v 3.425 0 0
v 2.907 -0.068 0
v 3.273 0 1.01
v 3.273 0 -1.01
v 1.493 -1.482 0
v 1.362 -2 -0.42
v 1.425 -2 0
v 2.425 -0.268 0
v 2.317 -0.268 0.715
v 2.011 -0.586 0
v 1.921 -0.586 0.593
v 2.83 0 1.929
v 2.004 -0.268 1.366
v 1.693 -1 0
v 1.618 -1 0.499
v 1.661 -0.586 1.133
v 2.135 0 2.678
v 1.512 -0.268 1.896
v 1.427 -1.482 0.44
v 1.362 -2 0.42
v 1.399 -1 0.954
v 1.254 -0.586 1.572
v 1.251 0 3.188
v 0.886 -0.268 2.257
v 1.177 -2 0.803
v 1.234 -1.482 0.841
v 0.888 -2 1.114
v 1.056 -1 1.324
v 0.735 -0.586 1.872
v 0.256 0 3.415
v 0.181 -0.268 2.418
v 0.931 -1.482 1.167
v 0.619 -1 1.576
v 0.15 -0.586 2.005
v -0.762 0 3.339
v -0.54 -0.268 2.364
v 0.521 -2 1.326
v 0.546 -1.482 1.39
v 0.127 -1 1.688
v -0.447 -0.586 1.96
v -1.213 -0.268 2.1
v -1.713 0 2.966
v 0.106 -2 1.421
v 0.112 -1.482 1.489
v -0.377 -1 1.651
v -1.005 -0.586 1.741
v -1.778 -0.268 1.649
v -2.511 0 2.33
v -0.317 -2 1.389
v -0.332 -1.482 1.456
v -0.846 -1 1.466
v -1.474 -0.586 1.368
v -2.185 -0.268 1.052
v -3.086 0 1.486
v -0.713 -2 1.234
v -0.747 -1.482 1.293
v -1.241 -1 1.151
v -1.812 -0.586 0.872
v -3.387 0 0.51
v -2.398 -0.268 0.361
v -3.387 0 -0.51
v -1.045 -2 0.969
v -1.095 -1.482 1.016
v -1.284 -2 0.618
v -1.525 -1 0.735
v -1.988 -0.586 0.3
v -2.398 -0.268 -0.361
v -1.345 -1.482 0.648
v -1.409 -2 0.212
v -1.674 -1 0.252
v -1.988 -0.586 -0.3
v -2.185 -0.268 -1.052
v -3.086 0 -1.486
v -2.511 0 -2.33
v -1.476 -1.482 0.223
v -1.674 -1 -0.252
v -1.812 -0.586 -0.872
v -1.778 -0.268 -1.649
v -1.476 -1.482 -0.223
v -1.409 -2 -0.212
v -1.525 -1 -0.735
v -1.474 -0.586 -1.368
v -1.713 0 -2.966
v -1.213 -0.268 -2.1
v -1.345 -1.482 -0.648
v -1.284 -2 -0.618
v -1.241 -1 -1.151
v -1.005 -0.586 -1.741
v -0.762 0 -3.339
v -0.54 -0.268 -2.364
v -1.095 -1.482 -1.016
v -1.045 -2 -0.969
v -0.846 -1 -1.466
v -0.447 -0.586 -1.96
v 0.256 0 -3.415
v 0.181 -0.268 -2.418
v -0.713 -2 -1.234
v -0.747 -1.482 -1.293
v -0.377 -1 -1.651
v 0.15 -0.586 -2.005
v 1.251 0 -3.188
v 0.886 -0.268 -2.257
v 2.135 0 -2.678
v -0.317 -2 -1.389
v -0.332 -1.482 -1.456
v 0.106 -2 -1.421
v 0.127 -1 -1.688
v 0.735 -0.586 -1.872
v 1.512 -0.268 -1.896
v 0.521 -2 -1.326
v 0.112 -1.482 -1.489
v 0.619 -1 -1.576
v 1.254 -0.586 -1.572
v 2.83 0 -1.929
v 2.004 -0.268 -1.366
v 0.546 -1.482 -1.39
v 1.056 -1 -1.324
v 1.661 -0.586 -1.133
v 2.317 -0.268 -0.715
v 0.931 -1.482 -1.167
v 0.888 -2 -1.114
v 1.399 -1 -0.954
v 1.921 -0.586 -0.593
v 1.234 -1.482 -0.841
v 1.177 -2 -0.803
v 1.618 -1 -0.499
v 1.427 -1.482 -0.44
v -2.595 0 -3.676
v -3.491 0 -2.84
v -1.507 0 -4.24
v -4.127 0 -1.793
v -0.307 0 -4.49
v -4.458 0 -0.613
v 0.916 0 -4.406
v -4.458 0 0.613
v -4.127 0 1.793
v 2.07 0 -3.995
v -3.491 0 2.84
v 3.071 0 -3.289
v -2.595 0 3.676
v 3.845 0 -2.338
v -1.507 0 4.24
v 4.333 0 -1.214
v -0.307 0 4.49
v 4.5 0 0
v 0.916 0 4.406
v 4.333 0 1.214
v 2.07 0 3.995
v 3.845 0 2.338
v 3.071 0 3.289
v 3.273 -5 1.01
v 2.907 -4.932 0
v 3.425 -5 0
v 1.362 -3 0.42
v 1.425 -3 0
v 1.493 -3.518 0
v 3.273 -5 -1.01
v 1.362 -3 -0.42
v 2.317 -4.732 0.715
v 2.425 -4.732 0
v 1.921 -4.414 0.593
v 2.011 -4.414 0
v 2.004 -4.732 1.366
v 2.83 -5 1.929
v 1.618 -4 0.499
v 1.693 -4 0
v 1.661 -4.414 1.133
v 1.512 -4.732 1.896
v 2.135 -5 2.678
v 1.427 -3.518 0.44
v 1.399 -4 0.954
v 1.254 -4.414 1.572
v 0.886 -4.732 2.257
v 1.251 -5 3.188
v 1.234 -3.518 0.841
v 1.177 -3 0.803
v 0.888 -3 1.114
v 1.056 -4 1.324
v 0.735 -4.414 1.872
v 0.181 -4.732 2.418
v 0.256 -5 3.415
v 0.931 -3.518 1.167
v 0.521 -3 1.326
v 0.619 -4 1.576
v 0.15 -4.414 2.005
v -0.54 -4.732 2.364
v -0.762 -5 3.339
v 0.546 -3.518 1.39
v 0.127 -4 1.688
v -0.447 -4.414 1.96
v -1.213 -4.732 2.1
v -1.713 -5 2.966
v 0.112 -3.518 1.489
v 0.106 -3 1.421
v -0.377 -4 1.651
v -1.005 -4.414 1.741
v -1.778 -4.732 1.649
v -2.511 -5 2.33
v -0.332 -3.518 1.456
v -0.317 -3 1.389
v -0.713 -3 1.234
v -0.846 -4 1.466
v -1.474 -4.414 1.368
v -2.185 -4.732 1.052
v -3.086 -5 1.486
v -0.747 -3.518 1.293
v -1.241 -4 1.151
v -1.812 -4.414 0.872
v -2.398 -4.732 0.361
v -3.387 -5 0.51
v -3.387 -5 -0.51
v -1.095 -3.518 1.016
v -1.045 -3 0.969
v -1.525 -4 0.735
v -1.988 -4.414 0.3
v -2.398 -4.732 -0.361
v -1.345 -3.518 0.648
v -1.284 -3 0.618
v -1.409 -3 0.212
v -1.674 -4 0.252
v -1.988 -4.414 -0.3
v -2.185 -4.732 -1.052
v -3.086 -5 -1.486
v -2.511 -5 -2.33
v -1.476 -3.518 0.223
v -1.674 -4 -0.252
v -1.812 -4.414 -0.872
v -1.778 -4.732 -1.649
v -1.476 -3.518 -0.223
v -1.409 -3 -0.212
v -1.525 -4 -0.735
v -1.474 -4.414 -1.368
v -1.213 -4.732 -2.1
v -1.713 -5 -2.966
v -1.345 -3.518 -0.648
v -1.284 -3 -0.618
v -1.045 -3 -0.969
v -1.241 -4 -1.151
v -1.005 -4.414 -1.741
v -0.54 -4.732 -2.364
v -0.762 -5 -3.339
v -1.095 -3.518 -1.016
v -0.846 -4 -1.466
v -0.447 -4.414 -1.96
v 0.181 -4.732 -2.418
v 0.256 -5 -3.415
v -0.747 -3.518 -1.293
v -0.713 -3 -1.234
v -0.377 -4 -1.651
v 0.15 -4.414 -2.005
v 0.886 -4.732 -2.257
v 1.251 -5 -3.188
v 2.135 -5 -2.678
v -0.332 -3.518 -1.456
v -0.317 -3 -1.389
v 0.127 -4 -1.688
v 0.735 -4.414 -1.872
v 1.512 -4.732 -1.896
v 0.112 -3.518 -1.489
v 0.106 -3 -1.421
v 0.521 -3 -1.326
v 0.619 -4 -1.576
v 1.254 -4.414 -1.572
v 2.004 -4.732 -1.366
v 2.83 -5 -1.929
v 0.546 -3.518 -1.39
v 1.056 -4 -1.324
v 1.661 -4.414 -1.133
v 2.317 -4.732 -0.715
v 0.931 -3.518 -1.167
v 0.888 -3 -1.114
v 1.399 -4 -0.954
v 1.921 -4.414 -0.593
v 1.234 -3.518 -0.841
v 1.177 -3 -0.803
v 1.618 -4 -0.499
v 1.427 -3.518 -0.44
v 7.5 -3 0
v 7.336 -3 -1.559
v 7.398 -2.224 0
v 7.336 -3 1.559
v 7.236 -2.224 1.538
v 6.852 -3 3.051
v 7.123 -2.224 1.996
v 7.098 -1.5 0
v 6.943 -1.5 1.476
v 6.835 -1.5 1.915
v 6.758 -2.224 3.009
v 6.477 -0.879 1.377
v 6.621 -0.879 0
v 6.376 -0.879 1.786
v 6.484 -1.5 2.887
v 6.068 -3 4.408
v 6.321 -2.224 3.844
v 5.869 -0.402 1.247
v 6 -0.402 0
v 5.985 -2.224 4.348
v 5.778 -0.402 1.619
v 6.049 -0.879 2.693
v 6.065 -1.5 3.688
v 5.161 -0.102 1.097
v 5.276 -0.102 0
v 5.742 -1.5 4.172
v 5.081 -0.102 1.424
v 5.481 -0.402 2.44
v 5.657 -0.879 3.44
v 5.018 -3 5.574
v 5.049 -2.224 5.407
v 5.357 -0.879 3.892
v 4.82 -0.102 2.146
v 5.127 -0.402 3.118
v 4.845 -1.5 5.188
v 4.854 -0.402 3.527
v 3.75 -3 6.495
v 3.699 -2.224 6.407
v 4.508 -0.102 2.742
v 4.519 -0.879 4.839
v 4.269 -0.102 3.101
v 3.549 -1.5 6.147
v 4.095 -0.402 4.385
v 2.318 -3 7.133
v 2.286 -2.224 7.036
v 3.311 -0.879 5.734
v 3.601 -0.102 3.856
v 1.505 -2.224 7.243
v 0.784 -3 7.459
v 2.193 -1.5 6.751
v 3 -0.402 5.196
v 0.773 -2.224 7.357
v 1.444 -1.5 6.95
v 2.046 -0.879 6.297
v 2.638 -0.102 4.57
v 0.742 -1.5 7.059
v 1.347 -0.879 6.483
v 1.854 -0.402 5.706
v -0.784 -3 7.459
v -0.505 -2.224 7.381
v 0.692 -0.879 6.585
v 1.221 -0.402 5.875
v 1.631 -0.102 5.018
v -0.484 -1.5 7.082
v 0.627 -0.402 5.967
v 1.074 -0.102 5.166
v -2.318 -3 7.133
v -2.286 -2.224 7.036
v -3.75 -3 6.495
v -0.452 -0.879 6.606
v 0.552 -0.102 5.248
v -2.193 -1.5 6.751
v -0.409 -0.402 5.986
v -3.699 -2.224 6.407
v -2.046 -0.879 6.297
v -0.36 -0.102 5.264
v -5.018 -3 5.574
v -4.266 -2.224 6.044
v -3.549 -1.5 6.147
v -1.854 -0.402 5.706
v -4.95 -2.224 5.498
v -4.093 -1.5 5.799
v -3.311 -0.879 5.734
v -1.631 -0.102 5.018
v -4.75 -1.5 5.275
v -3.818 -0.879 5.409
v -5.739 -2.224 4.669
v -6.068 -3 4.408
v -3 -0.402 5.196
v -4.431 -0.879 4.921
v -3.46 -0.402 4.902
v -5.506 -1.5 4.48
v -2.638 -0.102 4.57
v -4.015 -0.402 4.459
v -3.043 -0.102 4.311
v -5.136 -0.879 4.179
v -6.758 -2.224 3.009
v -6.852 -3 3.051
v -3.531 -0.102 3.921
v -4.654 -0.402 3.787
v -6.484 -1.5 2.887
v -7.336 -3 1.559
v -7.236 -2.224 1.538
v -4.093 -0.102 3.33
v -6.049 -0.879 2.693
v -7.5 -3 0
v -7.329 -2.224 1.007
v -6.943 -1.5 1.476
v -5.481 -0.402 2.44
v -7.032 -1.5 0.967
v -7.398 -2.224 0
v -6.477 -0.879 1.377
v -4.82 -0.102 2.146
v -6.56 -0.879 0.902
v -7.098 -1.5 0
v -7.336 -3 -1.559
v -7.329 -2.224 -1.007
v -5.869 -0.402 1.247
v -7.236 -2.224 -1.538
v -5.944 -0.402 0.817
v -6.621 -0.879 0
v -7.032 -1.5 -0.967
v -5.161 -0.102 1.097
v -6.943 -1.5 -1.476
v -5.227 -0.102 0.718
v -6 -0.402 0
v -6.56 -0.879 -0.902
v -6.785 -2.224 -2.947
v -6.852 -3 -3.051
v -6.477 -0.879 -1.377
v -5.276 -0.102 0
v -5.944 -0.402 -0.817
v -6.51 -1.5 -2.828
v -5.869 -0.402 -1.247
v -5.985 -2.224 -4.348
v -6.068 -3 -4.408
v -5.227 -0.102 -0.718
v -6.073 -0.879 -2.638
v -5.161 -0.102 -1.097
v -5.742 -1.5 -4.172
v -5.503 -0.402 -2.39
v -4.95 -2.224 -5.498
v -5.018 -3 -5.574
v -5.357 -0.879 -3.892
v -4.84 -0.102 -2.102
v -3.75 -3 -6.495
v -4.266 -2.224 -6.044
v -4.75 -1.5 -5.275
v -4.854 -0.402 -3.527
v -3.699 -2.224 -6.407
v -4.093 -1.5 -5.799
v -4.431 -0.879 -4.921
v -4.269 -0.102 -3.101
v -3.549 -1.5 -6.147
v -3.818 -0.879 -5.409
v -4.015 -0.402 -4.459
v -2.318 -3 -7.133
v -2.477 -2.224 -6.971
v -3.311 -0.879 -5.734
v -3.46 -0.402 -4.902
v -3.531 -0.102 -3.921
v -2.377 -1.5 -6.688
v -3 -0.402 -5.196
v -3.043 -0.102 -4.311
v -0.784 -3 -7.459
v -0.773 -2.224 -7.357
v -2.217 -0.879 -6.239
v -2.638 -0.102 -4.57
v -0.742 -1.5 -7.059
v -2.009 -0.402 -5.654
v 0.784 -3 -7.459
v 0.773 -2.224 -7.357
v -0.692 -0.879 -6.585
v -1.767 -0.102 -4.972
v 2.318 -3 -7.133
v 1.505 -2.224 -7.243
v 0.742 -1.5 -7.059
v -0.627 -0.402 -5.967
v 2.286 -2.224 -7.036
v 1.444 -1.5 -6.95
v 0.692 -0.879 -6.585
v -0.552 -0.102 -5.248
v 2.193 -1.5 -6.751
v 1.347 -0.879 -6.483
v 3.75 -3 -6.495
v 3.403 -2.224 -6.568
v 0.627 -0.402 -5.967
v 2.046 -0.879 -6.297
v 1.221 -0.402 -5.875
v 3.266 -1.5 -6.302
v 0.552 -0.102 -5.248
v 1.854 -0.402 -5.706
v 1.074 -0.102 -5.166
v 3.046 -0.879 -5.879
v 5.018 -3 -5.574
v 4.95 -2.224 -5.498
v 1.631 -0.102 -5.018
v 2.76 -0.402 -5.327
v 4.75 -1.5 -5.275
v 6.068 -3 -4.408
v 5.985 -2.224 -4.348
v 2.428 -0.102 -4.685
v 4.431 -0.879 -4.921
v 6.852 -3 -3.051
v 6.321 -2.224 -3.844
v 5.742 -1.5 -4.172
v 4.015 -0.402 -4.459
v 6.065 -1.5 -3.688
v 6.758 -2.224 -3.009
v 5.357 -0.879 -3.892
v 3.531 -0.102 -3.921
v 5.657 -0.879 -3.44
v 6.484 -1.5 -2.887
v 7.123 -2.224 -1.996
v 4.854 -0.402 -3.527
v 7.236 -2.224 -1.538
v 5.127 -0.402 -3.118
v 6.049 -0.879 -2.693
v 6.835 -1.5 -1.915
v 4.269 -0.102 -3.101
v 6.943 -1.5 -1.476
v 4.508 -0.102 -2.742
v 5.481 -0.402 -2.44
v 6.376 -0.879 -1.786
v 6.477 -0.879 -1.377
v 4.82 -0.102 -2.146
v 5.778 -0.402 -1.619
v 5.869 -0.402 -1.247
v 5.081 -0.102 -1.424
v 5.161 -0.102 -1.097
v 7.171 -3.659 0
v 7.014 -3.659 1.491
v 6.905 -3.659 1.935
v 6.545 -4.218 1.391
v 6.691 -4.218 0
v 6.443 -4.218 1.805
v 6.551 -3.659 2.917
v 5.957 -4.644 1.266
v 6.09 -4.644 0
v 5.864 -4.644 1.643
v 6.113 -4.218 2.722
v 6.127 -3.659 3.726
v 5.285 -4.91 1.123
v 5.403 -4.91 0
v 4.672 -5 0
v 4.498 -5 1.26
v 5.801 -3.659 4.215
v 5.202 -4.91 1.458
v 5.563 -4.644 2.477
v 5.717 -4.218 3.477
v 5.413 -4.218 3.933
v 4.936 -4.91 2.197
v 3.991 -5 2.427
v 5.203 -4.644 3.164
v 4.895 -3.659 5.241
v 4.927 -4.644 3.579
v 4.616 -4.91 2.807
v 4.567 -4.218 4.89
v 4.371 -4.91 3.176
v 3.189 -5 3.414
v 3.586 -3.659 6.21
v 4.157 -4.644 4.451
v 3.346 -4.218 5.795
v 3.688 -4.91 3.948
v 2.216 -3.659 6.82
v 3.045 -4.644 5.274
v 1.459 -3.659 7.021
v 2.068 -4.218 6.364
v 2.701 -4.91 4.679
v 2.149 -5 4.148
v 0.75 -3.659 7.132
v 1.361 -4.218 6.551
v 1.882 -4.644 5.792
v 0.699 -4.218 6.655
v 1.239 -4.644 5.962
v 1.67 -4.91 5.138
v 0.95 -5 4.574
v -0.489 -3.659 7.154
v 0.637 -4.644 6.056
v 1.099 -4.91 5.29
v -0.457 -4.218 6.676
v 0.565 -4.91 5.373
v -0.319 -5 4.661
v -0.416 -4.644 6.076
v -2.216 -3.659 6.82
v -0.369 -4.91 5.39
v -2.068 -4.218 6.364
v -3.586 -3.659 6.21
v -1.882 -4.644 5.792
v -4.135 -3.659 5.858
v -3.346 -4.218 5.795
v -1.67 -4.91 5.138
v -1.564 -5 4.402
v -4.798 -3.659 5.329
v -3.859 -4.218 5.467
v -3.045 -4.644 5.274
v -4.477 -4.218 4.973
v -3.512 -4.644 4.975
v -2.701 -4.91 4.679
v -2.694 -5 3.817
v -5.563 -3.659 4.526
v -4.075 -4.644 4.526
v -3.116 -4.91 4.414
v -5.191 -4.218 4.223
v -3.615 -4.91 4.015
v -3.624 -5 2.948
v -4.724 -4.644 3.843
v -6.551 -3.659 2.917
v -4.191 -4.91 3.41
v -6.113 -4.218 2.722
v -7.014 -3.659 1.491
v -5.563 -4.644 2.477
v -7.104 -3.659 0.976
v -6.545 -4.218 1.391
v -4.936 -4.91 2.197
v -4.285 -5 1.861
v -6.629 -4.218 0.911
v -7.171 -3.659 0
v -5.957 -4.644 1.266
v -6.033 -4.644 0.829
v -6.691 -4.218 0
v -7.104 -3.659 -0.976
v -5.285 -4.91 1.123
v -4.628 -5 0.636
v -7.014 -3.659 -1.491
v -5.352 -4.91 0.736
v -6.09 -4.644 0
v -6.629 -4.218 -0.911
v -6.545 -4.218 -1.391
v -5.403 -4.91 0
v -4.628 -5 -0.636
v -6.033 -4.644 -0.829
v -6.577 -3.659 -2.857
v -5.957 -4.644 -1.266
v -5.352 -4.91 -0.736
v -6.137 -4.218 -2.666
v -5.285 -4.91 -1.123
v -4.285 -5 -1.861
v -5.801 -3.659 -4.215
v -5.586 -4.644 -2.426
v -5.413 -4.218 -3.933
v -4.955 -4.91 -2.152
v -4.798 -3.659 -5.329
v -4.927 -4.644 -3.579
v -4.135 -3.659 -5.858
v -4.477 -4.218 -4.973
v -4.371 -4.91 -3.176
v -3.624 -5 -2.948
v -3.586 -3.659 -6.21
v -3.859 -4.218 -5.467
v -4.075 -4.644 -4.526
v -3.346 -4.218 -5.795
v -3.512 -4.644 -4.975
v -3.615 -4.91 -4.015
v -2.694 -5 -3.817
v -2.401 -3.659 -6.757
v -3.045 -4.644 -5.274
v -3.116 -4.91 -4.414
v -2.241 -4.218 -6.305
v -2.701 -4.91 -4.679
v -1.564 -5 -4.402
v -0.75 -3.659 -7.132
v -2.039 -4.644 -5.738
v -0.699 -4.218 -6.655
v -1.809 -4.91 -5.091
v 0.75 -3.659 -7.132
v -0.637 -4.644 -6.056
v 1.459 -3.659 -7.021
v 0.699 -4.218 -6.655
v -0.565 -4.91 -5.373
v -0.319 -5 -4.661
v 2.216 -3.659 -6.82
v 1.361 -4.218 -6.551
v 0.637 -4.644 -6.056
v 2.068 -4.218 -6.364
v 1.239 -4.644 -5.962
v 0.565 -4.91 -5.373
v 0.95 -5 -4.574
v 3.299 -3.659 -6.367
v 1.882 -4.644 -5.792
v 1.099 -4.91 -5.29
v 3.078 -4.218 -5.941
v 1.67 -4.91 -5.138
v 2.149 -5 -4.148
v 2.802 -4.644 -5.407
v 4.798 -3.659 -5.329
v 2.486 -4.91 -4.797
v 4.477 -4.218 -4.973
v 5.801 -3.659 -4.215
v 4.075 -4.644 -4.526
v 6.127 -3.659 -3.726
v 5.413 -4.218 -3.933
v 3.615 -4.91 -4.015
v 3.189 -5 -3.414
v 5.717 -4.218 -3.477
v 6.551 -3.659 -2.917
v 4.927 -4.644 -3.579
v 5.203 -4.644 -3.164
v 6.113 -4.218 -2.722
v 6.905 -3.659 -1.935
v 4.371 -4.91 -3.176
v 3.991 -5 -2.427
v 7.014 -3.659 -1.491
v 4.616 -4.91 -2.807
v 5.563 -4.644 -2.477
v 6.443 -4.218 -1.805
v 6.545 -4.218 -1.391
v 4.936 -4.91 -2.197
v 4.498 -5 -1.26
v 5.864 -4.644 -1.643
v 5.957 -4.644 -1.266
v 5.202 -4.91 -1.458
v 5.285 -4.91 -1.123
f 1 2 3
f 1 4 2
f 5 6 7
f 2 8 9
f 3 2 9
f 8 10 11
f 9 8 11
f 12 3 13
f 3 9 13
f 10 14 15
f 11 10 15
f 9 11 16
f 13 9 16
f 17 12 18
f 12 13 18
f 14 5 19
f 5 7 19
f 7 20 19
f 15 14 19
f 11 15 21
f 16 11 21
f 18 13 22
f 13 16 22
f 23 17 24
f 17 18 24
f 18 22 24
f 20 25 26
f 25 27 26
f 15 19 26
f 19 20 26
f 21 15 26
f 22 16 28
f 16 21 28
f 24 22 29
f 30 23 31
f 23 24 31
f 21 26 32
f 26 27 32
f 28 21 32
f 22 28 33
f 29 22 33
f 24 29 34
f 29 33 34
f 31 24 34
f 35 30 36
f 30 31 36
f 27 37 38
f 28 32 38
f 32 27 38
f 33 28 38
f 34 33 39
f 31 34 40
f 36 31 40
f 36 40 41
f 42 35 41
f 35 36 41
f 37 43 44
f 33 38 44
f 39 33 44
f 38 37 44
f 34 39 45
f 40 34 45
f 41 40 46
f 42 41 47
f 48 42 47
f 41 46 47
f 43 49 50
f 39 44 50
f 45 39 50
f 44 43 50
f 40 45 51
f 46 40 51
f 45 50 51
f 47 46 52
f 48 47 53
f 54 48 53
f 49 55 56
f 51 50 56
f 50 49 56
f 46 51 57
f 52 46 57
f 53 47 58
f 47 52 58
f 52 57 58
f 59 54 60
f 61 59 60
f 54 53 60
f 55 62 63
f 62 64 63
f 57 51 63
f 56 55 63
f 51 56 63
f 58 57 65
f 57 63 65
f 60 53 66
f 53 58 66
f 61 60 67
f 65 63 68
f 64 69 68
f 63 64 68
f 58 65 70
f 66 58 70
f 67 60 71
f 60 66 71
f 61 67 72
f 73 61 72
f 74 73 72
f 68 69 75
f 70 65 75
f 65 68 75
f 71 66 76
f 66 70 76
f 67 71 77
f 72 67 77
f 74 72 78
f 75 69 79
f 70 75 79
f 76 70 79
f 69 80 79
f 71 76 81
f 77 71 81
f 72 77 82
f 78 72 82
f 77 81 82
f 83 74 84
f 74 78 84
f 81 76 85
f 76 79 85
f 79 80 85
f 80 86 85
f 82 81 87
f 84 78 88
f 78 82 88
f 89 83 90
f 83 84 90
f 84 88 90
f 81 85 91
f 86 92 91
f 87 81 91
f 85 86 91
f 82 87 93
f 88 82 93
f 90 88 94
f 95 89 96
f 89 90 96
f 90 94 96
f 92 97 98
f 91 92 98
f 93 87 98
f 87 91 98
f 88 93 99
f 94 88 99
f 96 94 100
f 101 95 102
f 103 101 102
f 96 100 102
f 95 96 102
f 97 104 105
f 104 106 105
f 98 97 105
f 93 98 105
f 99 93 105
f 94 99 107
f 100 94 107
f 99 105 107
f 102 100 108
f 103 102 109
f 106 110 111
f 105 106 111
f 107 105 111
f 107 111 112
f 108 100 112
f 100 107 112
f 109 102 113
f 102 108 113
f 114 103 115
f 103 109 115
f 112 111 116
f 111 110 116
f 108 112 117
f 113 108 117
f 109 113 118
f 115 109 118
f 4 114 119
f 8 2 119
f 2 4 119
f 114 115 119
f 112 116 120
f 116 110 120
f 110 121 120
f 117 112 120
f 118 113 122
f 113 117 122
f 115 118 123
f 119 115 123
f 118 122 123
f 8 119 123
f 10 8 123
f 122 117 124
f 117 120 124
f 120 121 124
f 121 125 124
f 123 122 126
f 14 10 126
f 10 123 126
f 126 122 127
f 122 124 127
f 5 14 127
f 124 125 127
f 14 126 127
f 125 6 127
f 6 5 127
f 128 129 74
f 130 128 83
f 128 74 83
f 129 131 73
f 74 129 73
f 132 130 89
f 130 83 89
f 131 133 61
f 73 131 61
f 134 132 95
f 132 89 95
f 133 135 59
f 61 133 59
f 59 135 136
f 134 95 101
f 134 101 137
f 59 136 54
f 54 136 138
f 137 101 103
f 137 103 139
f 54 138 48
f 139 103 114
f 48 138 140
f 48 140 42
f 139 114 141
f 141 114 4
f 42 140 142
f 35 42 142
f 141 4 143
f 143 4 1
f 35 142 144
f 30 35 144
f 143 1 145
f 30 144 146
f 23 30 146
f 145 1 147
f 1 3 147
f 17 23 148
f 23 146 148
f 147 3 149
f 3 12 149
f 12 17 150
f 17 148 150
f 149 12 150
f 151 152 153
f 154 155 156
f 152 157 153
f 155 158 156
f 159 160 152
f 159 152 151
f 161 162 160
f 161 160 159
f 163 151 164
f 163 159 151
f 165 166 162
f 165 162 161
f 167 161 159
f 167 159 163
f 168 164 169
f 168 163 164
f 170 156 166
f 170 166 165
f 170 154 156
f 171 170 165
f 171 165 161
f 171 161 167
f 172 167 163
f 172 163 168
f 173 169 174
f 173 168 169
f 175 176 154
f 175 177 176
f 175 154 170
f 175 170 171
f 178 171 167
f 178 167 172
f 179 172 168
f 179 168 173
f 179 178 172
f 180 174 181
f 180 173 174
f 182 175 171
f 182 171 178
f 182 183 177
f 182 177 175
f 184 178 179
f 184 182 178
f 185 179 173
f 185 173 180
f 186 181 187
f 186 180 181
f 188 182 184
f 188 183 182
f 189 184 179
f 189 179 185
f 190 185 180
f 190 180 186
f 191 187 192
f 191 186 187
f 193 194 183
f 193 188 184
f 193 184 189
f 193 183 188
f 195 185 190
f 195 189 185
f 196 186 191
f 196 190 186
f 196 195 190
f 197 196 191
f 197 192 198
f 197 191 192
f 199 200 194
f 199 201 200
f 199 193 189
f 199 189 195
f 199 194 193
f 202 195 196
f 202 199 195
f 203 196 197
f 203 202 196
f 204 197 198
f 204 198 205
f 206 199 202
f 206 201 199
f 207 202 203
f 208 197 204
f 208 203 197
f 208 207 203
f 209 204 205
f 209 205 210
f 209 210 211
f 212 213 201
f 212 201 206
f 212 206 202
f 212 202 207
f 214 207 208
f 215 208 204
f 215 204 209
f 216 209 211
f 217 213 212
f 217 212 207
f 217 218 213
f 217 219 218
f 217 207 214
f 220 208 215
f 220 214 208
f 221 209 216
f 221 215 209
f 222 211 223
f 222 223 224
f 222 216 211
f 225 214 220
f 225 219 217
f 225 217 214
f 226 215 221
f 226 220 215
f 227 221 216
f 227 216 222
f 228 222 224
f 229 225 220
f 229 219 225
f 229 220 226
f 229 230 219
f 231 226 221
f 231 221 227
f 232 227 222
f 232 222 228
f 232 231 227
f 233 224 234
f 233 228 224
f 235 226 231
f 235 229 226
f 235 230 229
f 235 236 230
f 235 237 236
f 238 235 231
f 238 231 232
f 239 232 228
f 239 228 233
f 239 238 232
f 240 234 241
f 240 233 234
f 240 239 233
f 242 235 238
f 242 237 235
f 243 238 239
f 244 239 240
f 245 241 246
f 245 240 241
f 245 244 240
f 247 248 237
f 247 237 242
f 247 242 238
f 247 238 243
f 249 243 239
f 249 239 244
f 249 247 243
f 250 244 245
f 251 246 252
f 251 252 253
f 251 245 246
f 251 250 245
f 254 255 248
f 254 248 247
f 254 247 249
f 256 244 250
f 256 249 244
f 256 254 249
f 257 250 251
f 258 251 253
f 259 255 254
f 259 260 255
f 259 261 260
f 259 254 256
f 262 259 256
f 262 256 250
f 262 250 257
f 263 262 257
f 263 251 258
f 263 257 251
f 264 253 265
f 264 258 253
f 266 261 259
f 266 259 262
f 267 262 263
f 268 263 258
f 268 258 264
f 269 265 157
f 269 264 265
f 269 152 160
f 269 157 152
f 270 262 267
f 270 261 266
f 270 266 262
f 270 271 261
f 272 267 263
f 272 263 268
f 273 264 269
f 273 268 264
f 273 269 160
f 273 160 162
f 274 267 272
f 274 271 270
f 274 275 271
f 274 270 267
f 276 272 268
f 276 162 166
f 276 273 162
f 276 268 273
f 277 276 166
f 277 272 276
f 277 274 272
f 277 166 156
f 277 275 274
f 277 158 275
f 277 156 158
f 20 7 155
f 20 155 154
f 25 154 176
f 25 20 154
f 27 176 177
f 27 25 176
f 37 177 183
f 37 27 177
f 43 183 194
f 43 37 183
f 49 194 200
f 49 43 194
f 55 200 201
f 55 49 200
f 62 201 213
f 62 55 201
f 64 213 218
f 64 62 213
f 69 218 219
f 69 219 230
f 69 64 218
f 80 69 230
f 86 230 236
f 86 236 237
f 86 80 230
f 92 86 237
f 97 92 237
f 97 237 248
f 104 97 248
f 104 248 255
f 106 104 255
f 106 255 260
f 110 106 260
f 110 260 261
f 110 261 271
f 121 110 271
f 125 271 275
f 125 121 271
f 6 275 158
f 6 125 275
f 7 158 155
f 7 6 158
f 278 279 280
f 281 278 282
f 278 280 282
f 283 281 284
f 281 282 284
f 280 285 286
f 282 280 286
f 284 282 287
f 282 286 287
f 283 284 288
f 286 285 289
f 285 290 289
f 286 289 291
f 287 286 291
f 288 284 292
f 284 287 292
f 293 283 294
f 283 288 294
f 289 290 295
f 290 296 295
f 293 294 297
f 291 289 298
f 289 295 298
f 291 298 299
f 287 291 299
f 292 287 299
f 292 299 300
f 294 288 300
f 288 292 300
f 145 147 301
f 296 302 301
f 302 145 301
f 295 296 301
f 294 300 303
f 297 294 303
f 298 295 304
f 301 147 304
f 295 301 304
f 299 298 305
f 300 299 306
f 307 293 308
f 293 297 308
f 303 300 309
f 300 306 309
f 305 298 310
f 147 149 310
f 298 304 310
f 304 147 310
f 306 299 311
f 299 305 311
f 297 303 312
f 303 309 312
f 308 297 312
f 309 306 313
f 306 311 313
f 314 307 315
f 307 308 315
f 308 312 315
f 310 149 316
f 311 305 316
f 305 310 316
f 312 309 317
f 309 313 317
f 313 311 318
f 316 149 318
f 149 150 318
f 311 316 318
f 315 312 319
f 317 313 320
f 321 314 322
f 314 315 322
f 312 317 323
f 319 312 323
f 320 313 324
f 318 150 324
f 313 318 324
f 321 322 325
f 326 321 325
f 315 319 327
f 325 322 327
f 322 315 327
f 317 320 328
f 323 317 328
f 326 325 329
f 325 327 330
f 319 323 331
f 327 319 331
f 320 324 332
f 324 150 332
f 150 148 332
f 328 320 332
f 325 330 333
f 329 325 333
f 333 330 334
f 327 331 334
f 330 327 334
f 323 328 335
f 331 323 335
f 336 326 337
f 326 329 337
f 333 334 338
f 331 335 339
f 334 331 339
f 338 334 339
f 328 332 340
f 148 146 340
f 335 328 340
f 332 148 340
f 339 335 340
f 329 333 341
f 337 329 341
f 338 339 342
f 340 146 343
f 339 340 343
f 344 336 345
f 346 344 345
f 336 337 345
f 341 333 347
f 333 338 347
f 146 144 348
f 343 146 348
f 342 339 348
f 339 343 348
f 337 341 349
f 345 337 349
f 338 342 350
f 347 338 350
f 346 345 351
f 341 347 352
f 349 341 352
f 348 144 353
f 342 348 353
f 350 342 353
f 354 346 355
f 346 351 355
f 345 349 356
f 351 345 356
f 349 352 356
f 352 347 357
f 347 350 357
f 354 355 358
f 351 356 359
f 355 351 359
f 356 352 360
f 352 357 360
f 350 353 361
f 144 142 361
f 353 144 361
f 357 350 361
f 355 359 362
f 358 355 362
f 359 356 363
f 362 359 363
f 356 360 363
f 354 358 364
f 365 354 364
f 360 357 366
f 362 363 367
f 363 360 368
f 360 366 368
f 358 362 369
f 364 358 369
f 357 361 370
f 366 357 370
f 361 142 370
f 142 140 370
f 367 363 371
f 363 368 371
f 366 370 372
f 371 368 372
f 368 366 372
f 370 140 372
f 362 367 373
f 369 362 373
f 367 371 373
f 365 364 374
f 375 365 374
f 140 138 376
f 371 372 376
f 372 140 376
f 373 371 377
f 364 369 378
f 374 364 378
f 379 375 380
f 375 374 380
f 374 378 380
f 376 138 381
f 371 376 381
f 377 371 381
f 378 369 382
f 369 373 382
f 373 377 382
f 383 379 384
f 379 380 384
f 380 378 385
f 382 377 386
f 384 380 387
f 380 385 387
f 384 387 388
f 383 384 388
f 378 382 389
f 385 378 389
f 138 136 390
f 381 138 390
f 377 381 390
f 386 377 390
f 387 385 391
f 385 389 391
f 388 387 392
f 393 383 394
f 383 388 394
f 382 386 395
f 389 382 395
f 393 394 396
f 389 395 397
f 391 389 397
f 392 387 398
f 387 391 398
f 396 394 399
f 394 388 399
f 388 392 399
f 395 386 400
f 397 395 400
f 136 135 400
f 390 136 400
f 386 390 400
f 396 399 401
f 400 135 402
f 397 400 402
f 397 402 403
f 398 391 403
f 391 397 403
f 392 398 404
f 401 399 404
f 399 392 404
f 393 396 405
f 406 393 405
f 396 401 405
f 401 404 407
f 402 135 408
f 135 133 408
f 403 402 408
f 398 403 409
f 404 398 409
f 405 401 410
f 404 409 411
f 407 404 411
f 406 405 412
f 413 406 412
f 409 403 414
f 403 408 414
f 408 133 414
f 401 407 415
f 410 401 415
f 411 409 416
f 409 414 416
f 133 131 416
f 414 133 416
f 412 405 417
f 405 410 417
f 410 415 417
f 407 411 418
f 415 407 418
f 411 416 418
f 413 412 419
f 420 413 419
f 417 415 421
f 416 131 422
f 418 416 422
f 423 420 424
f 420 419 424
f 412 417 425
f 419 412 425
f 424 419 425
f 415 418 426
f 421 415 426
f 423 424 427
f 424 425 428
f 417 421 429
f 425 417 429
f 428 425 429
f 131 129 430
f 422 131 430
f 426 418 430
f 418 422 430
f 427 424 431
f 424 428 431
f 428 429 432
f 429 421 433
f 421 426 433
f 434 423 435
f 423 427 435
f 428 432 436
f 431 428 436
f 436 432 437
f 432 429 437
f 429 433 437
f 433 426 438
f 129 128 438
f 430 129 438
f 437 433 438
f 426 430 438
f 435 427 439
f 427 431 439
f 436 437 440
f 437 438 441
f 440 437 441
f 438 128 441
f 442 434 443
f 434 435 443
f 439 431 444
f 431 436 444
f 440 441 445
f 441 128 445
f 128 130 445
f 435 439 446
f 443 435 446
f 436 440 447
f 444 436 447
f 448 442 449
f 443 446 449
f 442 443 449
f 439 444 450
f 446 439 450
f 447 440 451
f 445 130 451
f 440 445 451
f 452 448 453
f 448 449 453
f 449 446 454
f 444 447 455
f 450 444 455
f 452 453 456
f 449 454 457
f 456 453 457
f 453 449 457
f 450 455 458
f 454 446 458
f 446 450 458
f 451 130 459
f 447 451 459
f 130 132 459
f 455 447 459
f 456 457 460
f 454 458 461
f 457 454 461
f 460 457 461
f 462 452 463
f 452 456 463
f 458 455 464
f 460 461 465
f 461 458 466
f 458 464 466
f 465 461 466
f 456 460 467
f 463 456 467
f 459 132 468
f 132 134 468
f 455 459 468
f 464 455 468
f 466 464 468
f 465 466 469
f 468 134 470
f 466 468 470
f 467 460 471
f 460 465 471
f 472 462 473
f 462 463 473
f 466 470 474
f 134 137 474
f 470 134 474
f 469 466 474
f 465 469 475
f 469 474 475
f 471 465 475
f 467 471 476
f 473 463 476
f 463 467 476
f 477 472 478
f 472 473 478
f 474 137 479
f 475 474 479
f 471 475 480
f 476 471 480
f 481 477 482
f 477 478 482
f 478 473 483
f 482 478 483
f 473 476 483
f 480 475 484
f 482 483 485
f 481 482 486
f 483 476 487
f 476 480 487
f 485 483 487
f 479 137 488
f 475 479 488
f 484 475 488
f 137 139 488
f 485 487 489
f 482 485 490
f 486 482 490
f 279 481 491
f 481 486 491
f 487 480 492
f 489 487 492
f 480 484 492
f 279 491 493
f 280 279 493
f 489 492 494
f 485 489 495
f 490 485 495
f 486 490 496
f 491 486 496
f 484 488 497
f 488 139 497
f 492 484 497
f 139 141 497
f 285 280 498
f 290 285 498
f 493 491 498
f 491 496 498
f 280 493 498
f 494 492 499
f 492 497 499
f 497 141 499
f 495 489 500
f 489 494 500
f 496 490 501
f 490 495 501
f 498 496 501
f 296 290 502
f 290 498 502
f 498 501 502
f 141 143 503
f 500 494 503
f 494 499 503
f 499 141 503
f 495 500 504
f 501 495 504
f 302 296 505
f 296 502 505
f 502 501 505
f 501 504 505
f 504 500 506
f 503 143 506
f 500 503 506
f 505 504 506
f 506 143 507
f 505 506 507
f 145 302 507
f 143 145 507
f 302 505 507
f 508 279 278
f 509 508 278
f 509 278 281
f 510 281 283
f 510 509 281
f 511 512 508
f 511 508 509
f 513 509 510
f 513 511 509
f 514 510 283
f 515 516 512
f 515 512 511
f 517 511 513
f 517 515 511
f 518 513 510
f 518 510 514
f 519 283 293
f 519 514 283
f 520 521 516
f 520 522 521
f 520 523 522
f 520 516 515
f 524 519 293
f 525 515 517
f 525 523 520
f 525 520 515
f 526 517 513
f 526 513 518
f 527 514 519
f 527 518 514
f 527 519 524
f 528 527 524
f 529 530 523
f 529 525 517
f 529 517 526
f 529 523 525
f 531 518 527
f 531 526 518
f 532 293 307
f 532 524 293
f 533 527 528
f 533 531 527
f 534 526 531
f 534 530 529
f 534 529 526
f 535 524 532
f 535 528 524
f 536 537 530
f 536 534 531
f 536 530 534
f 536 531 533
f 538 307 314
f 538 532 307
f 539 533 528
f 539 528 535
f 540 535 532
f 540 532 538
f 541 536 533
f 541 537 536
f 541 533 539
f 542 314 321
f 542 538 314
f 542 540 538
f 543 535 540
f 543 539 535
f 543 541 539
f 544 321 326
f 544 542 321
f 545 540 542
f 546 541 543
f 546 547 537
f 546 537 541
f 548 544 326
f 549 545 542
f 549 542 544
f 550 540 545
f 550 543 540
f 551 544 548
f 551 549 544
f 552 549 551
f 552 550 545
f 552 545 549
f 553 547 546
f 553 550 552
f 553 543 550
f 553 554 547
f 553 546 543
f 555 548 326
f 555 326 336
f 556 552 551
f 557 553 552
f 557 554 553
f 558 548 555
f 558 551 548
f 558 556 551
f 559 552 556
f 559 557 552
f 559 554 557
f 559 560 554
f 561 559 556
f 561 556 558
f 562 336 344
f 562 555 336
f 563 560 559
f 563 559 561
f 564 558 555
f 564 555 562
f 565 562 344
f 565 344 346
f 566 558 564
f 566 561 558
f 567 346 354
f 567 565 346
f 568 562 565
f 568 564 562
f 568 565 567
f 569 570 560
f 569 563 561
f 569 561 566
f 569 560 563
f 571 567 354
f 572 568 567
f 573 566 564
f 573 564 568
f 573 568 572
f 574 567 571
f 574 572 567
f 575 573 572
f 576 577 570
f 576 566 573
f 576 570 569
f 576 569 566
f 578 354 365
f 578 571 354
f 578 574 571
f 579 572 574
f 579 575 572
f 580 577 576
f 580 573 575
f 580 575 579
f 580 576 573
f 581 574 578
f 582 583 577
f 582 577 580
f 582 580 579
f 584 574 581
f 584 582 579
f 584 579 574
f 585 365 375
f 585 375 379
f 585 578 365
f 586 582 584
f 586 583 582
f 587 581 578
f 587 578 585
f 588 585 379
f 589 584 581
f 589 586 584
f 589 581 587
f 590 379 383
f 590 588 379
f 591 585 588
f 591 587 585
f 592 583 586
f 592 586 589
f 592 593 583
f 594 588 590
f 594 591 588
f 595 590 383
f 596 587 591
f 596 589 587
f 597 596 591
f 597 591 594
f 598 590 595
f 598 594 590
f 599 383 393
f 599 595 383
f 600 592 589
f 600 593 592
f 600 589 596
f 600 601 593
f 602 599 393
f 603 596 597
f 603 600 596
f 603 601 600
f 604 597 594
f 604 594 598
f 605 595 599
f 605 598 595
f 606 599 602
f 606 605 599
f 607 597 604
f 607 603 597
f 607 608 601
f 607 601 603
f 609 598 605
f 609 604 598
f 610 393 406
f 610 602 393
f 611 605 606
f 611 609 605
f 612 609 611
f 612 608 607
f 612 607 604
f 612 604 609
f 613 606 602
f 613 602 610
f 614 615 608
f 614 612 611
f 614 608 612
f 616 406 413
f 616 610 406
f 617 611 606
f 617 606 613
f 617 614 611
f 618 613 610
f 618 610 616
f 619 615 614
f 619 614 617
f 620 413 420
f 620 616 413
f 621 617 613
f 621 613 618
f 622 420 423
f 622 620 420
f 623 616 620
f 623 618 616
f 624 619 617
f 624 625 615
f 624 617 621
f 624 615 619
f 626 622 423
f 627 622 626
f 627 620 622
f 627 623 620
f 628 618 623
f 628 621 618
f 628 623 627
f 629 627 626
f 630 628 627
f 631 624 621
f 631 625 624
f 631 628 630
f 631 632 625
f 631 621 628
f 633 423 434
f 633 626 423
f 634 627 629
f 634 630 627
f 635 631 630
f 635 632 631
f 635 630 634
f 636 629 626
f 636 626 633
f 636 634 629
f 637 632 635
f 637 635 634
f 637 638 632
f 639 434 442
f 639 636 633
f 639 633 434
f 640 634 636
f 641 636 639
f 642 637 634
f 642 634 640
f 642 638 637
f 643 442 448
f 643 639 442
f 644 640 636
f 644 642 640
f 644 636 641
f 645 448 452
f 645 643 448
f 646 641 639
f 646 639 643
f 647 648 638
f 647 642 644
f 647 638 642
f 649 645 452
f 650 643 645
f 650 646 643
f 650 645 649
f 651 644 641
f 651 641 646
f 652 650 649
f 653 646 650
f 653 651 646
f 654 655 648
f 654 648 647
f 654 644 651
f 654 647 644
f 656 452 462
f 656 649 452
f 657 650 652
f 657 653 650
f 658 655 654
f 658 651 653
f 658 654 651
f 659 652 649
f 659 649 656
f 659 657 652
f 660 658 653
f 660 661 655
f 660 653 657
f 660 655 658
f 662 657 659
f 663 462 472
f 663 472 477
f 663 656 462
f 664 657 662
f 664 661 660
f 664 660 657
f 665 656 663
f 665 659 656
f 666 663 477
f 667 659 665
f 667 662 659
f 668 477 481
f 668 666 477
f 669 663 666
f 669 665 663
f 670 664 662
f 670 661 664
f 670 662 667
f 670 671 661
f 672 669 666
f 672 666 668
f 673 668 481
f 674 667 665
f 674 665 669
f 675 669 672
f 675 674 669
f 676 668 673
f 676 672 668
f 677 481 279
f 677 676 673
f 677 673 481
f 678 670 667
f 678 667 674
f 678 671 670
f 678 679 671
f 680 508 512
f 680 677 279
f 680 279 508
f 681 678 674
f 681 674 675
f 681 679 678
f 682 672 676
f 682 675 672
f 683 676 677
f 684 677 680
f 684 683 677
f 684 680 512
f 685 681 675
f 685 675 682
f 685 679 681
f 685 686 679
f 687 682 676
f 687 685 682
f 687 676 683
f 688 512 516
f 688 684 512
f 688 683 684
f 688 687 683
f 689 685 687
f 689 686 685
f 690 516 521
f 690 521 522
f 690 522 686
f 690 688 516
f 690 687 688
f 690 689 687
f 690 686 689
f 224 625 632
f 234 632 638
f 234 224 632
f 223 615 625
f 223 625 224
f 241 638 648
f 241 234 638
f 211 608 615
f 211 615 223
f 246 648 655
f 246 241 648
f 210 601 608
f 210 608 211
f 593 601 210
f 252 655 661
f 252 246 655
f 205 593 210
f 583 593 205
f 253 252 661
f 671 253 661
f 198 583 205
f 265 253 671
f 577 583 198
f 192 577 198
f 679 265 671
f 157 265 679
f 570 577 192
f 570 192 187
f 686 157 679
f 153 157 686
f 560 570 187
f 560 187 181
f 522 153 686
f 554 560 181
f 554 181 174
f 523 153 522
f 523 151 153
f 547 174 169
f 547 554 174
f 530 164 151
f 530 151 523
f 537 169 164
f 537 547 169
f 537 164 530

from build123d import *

# Parameters (mm, degrees)
F0_R     = 7.5
F0_R_2   = 1.425
F1_DEPTH = 5
F2_R     = 3
F4_R     = 2


# Not quite as in the source:
# - a fillet or chamfer that OpenCascade refuses, or shapes differently, is made with other operations: its cross-section is extruded or revolved along the edge and cut away or added


with BuildPart() as f1:
    # F0 (on Front) → F1 (new body)
    with BuildSketch(Plane.XZ):
        Circle(F0_R)
        Circle(F0_R_2, mode=Mode.SUBTRACT)
    extrude(amount=F1_DEPTH)

    # F2
    f2_edges = [f1.edges().sort_by_distance(p)[0] for p in [
        (-7.5, 0, 0),
    ]]
    fillet(f2_edges, radius=F2_R)

    # F3: fillet of radius 3 on 1 edges, made by hand

    # F3_s1 → F3_t2 (revolve, cut)
    with BuildSketch(Plane.XY):
        with BuildLine():
            ThreePointArc((7.5, -3), (6.4036236828, -4.4494897428), (4.6715728753, -5))
            Line((4.6715728753, -5), (7.5, -5))
            Line((7.5, -5), (7.5, -3))
        make_face()
    revolve(axis=Axis((0, -5, 0), (0, -1, 0)), mode=Mode.SUBTRACT)

    # F4
    f4_edges = [f1.edges().sort_by_distance(p)[0] for p in [
        (1.425, -2.5, 0),
        (-1.425, 0, 0),
        (-1.425, -5, 0),
    ]]
    fillet(f4_edges, radius=F4_R)


solid = f1.part
